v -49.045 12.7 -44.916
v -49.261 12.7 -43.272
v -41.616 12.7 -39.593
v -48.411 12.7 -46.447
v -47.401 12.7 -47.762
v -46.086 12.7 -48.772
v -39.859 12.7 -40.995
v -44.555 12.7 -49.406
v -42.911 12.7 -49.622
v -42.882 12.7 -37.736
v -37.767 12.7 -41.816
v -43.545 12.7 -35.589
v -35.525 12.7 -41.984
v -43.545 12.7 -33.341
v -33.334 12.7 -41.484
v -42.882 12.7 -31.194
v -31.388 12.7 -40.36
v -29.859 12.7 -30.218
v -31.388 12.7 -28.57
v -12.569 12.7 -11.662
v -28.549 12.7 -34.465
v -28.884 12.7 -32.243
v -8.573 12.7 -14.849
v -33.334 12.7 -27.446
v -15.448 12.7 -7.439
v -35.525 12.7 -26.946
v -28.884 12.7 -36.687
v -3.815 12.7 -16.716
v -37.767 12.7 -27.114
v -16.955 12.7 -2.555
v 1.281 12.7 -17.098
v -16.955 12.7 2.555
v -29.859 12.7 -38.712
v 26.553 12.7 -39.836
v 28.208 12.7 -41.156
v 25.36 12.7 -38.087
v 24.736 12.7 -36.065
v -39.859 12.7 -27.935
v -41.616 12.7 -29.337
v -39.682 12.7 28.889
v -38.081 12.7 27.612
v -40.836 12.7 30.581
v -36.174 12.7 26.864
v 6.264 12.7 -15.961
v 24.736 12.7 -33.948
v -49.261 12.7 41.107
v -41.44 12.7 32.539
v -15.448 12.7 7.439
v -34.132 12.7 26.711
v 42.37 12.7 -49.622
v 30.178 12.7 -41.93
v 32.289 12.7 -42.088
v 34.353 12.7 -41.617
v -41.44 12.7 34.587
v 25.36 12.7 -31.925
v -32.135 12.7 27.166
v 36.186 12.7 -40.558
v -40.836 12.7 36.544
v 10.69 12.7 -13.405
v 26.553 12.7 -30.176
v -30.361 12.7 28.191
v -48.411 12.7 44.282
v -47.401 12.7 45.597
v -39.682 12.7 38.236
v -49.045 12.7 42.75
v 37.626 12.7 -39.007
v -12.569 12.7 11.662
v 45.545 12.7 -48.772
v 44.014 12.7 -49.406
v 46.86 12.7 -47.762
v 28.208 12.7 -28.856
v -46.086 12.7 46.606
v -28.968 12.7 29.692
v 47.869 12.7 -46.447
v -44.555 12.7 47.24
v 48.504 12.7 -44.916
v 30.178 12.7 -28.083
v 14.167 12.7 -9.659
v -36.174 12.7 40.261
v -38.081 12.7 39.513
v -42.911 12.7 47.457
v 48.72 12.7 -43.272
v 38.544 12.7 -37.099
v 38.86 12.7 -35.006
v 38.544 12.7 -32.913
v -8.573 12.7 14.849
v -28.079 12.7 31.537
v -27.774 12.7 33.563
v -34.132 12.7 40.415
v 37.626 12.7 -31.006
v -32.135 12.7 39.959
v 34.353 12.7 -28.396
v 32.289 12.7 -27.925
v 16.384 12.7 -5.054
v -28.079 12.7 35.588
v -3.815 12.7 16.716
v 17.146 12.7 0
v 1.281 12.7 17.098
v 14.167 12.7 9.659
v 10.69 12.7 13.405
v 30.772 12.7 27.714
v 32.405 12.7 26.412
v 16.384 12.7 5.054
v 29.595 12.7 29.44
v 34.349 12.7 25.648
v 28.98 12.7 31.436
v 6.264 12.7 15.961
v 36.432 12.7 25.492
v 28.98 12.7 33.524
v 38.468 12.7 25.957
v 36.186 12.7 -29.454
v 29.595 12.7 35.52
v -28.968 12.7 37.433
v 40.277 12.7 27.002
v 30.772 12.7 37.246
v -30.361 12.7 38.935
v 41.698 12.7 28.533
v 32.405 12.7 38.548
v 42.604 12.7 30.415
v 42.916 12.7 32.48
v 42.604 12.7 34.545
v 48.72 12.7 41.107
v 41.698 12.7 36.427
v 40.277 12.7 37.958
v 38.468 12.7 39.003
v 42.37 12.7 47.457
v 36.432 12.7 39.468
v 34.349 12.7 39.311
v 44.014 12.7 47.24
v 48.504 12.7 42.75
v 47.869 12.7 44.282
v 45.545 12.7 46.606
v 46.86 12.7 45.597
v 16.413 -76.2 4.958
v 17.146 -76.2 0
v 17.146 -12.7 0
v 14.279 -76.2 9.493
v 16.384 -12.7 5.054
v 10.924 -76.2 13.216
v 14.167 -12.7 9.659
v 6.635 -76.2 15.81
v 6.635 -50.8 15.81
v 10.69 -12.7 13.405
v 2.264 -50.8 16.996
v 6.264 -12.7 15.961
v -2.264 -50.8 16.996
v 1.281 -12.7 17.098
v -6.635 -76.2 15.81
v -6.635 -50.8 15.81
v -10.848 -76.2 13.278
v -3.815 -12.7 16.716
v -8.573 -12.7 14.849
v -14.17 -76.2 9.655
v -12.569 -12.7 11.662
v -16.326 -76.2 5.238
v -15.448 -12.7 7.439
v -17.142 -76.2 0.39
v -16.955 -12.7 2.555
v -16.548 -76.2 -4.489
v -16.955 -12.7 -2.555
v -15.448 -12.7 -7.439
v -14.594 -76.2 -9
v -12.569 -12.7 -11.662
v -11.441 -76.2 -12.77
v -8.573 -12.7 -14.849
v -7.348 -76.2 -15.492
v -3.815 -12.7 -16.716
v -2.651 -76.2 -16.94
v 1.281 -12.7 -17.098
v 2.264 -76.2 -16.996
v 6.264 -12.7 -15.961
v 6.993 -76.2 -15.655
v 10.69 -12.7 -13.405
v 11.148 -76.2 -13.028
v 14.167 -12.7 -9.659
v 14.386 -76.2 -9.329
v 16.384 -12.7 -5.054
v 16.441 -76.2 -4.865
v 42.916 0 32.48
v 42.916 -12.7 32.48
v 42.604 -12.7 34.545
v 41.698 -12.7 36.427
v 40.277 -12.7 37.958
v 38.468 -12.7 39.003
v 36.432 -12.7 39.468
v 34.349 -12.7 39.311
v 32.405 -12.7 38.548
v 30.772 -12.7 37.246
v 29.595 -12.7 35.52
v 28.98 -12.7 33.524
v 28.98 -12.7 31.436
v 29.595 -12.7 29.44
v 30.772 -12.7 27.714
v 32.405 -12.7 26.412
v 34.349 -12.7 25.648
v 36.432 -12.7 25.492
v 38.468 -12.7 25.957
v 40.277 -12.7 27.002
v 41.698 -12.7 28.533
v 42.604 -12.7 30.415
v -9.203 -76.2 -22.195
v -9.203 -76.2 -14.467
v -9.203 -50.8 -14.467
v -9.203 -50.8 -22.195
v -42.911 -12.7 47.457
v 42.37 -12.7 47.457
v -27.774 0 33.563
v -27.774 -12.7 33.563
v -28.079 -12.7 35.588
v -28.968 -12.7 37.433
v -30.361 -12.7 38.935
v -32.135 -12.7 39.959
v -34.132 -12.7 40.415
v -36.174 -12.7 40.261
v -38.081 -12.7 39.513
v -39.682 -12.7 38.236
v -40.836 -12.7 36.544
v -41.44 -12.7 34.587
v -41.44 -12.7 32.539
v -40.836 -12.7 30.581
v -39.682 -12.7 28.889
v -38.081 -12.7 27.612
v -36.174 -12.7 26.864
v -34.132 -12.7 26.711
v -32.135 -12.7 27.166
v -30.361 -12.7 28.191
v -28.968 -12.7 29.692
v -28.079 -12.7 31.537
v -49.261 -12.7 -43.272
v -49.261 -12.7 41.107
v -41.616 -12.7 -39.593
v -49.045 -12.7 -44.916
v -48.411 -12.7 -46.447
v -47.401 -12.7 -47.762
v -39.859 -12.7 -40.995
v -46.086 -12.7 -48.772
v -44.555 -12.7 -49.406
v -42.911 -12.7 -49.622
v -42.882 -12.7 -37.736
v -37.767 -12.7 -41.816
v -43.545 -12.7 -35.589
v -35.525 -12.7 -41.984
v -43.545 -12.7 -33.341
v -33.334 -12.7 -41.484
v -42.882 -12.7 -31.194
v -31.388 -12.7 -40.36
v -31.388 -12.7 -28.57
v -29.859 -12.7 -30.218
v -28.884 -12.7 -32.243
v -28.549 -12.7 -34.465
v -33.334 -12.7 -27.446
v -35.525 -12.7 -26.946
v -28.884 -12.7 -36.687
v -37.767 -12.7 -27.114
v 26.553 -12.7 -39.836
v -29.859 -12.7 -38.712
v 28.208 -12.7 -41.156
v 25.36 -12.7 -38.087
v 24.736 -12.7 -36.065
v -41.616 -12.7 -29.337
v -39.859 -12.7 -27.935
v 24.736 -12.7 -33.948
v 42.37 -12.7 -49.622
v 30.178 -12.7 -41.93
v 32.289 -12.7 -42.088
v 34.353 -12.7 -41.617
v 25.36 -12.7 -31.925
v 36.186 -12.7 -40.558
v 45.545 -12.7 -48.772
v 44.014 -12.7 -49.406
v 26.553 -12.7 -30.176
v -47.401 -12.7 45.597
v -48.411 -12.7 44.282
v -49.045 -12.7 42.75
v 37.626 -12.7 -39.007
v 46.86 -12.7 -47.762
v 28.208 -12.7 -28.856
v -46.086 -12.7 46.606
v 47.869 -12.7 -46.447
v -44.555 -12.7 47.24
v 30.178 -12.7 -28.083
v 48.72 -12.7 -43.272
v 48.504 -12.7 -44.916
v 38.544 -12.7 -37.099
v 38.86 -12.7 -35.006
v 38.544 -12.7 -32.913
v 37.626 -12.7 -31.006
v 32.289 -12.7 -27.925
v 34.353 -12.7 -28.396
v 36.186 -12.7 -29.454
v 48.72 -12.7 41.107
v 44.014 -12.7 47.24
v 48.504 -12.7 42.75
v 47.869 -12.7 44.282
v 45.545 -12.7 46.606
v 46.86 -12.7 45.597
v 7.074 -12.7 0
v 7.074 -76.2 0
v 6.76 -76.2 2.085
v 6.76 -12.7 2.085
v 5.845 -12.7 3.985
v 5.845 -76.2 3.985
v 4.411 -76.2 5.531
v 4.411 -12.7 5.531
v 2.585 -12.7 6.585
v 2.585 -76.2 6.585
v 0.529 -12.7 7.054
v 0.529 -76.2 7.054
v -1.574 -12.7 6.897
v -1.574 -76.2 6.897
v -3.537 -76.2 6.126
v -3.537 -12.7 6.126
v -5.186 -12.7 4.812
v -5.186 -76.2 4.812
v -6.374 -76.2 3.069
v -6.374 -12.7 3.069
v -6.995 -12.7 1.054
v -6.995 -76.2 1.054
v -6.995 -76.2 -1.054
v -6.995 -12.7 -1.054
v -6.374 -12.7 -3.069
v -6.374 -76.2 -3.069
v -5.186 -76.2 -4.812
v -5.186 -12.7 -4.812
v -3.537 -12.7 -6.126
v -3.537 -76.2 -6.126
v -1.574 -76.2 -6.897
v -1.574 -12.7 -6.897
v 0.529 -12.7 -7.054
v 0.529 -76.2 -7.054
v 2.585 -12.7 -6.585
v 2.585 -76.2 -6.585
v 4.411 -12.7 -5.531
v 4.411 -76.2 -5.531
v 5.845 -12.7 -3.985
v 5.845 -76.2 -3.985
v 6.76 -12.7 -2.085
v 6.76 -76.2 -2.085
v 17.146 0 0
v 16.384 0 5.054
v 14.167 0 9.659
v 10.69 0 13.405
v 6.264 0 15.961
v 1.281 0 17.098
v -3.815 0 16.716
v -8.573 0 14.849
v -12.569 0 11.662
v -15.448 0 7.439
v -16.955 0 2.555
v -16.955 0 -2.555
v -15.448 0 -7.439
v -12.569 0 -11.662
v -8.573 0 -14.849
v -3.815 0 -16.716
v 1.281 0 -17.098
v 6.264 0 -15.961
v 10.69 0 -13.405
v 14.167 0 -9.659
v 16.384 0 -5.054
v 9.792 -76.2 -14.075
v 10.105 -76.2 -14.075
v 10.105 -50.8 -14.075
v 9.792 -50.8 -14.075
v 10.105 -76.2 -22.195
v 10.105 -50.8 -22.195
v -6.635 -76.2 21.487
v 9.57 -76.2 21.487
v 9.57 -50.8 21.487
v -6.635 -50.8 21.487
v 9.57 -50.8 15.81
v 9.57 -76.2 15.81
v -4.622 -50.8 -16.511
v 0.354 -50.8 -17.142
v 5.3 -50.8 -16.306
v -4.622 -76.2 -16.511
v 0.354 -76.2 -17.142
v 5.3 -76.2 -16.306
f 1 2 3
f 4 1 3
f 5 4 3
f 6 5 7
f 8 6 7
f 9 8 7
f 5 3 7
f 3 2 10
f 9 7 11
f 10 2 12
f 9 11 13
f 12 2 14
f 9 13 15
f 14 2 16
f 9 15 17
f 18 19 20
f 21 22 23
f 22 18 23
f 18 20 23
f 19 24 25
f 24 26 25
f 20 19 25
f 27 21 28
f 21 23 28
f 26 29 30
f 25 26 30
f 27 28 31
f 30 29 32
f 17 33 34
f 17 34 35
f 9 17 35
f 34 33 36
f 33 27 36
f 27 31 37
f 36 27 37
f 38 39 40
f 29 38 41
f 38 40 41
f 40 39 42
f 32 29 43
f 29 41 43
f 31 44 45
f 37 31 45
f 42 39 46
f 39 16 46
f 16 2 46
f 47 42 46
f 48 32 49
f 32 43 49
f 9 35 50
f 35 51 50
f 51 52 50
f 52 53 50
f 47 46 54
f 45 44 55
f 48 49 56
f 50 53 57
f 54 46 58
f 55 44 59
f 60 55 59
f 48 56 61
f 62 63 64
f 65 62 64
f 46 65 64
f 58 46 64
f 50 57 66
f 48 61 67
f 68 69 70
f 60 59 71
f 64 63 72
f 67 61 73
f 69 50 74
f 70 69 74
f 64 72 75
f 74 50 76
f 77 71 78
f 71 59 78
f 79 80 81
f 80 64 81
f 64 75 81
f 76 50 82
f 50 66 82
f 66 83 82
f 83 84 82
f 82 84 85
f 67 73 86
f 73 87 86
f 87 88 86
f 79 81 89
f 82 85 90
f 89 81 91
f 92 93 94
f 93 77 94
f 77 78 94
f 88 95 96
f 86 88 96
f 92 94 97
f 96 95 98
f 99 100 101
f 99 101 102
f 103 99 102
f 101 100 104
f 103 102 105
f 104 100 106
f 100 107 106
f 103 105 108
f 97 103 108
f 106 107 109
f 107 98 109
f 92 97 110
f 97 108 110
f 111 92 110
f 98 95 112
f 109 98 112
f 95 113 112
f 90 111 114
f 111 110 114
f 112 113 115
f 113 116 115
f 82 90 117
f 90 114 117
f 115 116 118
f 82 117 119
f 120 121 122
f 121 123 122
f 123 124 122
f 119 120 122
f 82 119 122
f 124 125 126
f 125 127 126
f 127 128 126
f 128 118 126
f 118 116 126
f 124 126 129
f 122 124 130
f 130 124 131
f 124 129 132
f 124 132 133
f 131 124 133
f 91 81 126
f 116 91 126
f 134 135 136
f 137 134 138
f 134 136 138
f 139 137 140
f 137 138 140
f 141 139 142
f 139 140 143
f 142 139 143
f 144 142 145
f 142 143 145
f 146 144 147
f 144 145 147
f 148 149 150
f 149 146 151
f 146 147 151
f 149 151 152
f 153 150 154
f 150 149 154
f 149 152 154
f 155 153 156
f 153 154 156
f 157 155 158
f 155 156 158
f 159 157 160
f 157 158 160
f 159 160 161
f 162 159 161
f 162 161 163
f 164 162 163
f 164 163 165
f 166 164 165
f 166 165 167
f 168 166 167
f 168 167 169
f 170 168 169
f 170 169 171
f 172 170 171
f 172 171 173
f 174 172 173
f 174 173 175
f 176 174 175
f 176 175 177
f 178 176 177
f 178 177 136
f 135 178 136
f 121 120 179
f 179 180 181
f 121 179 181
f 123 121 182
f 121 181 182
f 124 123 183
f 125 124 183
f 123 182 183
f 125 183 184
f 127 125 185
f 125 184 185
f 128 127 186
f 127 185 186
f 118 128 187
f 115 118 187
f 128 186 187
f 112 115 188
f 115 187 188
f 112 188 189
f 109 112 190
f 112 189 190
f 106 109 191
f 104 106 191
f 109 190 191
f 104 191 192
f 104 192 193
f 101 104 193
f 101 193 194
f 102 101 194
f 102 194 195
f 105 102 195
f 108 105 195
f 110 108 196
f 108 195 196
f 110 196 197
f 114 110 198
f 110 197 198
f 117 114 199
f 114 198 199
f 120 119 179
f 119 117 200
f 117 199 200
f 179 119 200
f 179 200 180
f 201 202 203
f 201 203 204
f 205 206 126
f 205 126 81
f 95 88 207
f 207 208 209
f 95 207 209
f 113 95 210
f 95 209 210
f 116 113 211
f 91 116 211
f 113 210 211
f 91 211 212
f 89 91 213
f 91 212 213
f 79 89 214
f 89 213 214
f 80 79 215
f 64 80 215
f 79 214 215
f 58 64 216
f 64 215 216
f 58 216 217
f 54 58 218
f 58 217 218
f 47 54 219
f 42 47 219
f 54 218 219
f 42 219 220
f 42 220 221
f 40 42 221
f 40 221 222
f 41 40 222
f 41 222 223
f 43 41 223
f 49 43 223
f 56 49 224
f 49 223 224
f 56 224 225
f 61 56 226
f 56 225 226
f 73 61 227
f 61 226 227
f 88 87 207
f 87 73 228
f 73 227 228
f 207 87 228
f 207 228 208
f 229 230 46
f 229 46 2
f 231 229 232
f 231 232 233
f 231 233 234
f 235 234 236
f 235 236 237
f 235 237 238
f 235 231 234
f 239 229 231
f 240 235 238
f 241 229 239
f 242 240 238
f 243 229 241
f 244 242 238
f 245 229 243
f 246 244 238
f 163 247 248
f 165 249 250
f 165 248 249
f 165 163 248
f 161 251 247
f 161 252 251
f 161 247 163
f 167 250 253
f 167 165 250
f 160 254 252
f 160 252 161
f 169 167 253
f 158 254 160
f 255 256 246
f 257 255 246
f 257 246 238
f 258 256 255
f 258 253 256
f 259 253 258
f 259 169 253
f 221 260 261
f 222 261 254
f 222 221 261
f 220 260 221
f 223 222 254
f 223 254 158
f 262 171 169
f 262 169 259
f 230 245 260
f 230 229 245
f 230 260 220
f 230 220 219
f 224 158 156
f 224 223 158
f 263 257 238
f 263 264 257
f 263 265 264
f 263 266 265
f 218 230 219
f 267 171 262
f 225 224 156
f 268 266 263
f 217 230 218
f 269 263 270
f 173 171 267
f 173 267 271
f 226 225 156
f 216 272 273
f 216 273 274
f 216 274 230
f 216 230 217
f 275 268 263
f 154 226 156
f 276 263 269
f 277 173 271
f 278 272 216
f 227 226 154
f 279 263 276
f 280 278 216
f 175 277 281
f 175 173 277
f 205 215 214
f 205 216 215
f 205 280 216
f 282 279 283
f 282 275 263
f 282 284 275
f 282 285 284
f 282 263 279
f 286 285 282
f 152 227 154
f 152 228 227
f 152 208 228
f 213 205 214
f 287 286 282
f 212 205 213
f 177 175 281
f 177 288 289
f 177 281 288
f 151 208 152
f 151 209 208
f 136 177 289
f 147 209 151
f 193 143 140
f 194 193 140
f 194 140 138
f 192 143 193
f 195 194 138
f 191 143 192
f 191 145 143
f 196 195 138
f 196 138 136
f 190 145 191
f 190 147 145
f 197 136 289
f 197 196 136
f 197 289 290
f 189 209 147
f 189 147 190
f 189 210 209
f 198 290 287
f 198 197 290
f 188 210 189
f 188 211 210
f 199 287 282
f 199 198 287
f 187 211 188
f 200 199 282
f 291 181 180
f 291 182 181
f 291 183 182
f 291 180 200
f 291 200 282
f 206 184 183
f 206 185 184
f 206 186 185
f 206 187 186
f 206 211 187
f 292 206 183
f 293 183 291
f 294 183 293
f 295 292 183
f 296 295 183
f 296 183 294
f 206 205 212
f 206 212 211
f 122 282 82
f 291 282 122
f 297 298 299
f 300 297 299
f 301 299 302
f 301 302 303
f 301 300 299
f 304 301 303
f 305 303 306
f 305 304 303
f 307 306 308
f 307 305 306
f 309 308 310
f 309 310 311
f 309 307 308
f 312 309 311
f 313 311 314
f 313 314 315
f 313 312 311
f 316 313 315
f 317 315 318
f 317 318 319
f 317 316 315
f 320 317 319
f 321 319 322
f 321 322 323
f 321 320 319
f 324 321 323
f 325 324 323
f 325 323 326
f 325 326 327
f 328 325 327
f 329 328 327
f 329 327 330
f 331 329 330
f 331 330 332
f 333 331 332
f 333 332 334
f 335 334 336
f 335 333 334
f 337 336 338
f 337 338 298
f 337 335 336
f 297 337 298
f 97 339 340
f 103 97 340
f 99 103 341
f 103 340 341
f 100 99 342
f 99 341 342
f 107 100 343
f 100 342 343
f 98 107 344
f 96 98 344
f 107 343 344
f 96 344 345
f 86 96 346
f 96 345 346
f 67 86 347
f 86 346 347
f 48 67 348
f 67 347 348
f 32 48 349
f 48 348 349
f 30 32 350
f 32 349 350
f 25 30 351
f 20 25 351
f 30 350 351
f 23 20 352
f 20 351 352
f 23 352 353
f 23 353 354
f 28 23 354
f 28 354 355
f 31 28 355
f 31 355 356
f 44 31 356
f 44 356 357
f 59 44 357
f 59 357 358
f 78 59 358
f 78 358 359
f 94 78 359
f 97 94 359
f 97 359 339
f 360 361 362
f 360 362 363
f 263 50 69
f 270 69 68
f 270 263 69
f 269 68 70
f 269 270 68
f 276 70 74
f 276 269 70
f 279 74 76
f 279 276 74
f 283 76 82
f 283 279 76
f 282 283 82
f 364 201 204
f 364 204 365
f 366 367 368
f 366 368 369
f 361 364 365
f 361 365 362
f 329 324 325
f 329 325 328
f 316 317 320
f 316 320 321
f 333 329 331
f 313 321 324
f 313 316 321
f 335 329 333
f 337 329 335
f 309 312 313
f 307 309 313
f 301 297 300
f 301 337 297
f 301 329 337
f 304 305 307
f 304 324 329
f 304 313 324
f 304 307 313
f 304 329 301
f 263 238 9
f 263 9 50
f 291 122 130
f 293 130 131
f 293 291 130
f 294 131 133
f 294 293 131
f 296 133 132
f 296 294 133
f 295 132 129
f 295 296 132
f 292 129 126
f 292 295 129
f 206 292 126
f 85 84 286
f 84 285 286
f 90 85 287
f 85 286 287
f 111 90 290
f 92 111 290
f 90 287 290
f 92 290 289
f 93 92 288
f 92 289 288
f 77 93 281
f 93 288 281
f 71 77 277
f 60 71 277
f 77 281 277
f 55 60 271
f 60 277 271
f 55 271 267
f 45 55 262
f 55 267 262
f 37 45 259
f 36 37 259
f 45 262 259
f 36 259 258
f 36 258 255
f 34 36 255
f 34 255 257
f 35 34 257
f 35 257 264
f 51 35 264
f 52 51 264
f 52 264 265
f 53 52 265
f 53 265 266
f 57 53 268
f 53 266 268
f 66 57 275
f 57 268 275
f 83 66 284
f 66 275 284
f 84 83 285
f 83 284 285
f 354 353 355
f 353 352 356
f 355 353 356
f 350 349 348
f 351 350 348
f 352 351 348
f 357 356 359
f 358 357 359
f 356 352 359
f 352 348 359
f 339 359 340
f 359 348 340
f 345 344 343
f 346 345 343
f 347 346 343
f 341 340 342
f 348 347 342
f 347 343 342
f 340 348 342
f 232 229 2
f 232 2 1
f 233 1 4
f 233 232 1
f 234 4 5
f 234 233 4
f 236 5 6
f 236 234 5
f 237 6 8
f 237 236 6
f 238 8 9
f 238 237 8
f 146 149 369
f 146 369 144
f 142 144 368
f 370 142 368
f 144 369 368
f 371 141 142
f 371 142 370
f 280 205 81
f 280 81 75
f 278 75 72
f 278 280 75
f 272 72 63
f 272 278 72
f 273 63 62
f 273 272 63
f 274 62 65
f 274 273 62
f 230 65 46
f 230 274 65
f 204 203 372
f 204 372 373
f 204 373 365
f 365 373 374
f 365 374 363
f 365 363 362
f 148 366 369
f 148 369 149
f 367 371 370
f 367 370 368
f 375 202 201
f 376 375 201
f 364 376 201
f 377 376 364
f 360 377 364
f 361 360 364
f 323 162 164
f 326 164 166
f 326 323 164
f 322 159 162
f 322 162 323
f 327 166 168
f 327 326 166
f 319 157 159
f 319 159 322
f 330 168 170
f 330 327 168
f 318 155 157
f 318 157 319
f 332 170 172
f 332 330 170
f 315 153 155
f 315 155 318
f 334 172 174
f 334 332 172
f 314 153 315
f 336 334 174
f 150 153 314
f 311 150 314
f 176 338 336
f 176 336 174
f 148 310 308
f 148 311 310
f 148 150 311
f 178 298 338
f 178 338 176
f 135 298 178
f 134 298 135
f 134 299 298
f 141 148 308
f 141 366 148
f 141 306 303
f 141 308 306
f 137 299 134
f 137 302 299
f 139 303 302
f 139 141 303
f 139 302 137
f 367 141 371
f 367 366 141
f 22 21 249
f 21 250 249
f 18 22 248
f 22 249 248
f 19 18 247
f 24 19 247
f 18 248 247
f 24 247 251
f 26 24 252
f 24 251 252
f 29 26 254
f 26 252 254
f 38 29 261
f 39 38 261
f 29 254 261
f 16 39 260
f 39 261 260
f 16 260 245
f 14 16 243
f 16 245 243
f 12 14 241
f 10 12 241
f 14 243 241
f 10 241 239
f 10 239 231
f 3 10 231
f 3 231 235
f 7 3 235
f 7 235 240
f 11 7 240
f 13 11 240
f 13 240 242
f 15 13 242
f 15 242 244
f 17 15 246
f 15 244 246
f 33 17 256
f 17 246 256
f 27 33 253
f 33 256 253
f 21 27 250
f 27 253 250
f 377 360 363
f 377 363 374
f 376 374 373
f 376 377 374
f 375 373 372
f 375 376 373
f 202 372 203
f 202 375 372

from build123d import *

# Parameters (mm, degrees)
F0_R         = 7.5399052203
F0_R_2       = 7.1012789698
F0_R_3       = 6.8711271947
F0_R_4       = 7.0071962971
F1_DEPTH     = 12.7
F2_R         = 17.146018536
F2_R_2       = 7.0742640009
F3_DEPTH     = 63.5
F5_W         = 16.9617831707
F5_H         = 33.7431207299
F5_R         = 4.6042822581
F5_R_2       = 4.72658434
F6_DEPTH     = 5.08
F3_FACE1_R   = 7.5399052203
F3_FACE1_R_2 = 7.1012789698
F3_FACE1_R_3 = 6.8711271947
F3_FACE1_R_4 = 17.146018536
F3_FACE1_R_5 = 7.0071962971
F8_DEPTH     = 25.399999693
F11_DEPTH    = 25.399999693


with BuildPart() as f1:
    # F0 (on Front) → F1 (new body)
    with BuildSketch(Plane.XZ):
        with BuildLine():
            Line((42.3700170755, 47.4568530917), (-42.9113464594, 47.4568530917))
            ThreePointArc((-42.9113464594, 47.4568530917), (-47.4014745199, 45.5969811523), (-49.2613464594, 41.1068530917))
            Line((-49.2613464594, 41.1068530917), (-49.2613464594, -43.272297287))
            ThreePointArc((-49.2613464594, -43.272297287), (-47.4014745199, -47.7624253475), (-42.9113464594, -49.622297287))
            Line((-42.9113464594, -49.622297287), (42.3700170755, -49.622297287))
            ThreePointArc((42.3700170755, -49.622297287), (46.8601451361, -47.7624253475), (48.7200170755, -43.272297287))
            Line((48.7200170755, -43.272297287), (48.7200170755, 41.1068530917))
            ThreePointArc((48.7200170755, 41.1068530917), (46.8601451361, 45.5969811523), (42.3700170755, 47.4568530917))
        make_face()
        with Locations((-36.088898778, -34.4649553299)):
            Circle(F0_R, mode=Mode.SUBTRACT)
        with Locations((31.7582339048, -35.0062847137)):
            Circle(F0_R_2, mode=Mode.SUBTRACT)
        with Locations((-34.6453487873, 33.562630415)):
            Circle(F0_R_3, mode=Mode.SUBTRACT)
        with Locations((35.9084606171, 32.4799567461)):
            Circle(F0_R_4, mode=Mode.SUBTRACT)
    extrude(amount=F1_DEPTH)

    # F2 (on face) → F3 (join)
    with BuildSketch(Plane.XZ.offset(12.7)):
        Circle(F2_R)
        Circle(F2_R_2, mode=Mode.SUBTRACT)
    extrude(amount=F3_DEPTH)

    # F3_face1 (on face) + F7 (on face) → F8 (join)
    with BuildSketch(Plane(origin=(-0.1960246681, -12.7, -1.0801262711), x_dir=(1, 0, 0), z_dir=(0, -1, 0))):
        with BuildLine():
            Line((42.5660417436, 48.5369793628), (-42.7153217913, 48.5369793628))
            ThreePointArc((-42.7153217913, 48.5369793628), (-47.2054498519, 46.6771074234), (-49.0653217913, 42.1869793628))
            Line((-49.0653217913, 42.1869793628), (-49.0653217913, -42.1921710159))
            ThreePointArc((-49.0653217913, -42.1921710159), (-47.2054498519, -46.6822990764), (-42.7153217913, -48.5421710159))
            Line((-42.7153217913, -48.5421710159), (42.5660417436, -48.5421710159))
            ThreePointArc((42.5660417436, -48.5421710159), (47.0561698041, -46.6822990764), (48.9160417436, -42.1921710159))
            Line((48.9160417436, -42.1921710159), (48.9160417436, 42.1869793628))
            ThreePointArc((48.9160417436, 42.1869793628), (47.0561698041, 46.6771074234), (42.5660417436, 48.5369793628))
        make_face()
        with Locations((-35.8928741099, -33.3848290588)):
            Circle(F3_FACE1_R, mode=Mode.SUBTRACT)
        with Locations((31.9542585729, -33.9261584426)):
            Circle(F3_FACE1_R_2, mode=Mode.SUBTRACT)
        with Locations((-34.4493241193, 34.6427566861)):
            Circle(F3_FACE1_R_3, mode=Mode.SUBTRACT)
        with Locations((0.1960246681, 1.0801262711)):
            Circle(F3_FACE1_R_4, mode=Mode.SUBTRACT)
        with Locations((36.1044852851, 33.5600830172)):
            Circle(F3_FACE1_R_5, mode=Mode.SUBTRACT)
    with BuildSketch(Plane.XZ.offset(76.2)):
        with BuildLine():
            Line((-6.6351802151, 21.4874055237), (-6.6351802151, 15.8101339385))
            ThreePointArc((-6.6351802151, 15.8101339385), (0, 17.146018536), (6.6351802151, 15.8101339385))
            Line((6.6351802151, 15.8101339385), (9.570017457, 15.8101339385))
            Line((9.570017457, 15.8101339385), (9.570017457, 21.4874055237))
            Line((9.570017457, 21.4874055237), (-6.6351802151, 21.4874055237))
        make_face()
    extrude(amount=-F8_DEPTH)


with BuildPart() as f6:
    # F5 (on offset) → F6 (new body)
    with BuildSketch(Plane(origin=(0, 0, -17.872297287), x_dir=(1, 0, 0), z_dir=(0, 0, -1))):
        with Locations((1.4435499907, 59.6369020641)):
            Rectangle(F5_W, F5_H)
        with Locations((1.4435499907, 50.5322441459)):
            Circle(F5_R, mode=Mode.SUBTRACT)
        with Locations((1.4435499907, 68.0471807718)):
            Circle(F5_R_2, mode=Mode.SUBTRACT)
    extrude(amount=F6_DEPTH)


with BuildPart() as f11:
    # F10 (on face) → F11 (new body)
    with BuildSketch(Plane.XZ.offset(76.2)):
        with BuildLine():
            Line((10.1048946381, -14.0747278929), (9.7922411316, -14.0747278929))
            ThreePointArc((9.7922411316, -14.0747278929), (0.3540969939, -17.1423617672), (-9.2026740313, -14.4670917019))
            Line((-9.2026740313, -14.4670917019), (-9.2026740313, -22.1947282553))
            Line((-9.2026740313, -22.1947282553), (10.1048946381, -22.1947282553))
            Line((10.1048946381, -22.1947282553), (10.1048946381, -14.0747278929))
        make_face()
    extrude(amount=-F11_DEPTH)


solid = Compound([f1.part, f11.part])
